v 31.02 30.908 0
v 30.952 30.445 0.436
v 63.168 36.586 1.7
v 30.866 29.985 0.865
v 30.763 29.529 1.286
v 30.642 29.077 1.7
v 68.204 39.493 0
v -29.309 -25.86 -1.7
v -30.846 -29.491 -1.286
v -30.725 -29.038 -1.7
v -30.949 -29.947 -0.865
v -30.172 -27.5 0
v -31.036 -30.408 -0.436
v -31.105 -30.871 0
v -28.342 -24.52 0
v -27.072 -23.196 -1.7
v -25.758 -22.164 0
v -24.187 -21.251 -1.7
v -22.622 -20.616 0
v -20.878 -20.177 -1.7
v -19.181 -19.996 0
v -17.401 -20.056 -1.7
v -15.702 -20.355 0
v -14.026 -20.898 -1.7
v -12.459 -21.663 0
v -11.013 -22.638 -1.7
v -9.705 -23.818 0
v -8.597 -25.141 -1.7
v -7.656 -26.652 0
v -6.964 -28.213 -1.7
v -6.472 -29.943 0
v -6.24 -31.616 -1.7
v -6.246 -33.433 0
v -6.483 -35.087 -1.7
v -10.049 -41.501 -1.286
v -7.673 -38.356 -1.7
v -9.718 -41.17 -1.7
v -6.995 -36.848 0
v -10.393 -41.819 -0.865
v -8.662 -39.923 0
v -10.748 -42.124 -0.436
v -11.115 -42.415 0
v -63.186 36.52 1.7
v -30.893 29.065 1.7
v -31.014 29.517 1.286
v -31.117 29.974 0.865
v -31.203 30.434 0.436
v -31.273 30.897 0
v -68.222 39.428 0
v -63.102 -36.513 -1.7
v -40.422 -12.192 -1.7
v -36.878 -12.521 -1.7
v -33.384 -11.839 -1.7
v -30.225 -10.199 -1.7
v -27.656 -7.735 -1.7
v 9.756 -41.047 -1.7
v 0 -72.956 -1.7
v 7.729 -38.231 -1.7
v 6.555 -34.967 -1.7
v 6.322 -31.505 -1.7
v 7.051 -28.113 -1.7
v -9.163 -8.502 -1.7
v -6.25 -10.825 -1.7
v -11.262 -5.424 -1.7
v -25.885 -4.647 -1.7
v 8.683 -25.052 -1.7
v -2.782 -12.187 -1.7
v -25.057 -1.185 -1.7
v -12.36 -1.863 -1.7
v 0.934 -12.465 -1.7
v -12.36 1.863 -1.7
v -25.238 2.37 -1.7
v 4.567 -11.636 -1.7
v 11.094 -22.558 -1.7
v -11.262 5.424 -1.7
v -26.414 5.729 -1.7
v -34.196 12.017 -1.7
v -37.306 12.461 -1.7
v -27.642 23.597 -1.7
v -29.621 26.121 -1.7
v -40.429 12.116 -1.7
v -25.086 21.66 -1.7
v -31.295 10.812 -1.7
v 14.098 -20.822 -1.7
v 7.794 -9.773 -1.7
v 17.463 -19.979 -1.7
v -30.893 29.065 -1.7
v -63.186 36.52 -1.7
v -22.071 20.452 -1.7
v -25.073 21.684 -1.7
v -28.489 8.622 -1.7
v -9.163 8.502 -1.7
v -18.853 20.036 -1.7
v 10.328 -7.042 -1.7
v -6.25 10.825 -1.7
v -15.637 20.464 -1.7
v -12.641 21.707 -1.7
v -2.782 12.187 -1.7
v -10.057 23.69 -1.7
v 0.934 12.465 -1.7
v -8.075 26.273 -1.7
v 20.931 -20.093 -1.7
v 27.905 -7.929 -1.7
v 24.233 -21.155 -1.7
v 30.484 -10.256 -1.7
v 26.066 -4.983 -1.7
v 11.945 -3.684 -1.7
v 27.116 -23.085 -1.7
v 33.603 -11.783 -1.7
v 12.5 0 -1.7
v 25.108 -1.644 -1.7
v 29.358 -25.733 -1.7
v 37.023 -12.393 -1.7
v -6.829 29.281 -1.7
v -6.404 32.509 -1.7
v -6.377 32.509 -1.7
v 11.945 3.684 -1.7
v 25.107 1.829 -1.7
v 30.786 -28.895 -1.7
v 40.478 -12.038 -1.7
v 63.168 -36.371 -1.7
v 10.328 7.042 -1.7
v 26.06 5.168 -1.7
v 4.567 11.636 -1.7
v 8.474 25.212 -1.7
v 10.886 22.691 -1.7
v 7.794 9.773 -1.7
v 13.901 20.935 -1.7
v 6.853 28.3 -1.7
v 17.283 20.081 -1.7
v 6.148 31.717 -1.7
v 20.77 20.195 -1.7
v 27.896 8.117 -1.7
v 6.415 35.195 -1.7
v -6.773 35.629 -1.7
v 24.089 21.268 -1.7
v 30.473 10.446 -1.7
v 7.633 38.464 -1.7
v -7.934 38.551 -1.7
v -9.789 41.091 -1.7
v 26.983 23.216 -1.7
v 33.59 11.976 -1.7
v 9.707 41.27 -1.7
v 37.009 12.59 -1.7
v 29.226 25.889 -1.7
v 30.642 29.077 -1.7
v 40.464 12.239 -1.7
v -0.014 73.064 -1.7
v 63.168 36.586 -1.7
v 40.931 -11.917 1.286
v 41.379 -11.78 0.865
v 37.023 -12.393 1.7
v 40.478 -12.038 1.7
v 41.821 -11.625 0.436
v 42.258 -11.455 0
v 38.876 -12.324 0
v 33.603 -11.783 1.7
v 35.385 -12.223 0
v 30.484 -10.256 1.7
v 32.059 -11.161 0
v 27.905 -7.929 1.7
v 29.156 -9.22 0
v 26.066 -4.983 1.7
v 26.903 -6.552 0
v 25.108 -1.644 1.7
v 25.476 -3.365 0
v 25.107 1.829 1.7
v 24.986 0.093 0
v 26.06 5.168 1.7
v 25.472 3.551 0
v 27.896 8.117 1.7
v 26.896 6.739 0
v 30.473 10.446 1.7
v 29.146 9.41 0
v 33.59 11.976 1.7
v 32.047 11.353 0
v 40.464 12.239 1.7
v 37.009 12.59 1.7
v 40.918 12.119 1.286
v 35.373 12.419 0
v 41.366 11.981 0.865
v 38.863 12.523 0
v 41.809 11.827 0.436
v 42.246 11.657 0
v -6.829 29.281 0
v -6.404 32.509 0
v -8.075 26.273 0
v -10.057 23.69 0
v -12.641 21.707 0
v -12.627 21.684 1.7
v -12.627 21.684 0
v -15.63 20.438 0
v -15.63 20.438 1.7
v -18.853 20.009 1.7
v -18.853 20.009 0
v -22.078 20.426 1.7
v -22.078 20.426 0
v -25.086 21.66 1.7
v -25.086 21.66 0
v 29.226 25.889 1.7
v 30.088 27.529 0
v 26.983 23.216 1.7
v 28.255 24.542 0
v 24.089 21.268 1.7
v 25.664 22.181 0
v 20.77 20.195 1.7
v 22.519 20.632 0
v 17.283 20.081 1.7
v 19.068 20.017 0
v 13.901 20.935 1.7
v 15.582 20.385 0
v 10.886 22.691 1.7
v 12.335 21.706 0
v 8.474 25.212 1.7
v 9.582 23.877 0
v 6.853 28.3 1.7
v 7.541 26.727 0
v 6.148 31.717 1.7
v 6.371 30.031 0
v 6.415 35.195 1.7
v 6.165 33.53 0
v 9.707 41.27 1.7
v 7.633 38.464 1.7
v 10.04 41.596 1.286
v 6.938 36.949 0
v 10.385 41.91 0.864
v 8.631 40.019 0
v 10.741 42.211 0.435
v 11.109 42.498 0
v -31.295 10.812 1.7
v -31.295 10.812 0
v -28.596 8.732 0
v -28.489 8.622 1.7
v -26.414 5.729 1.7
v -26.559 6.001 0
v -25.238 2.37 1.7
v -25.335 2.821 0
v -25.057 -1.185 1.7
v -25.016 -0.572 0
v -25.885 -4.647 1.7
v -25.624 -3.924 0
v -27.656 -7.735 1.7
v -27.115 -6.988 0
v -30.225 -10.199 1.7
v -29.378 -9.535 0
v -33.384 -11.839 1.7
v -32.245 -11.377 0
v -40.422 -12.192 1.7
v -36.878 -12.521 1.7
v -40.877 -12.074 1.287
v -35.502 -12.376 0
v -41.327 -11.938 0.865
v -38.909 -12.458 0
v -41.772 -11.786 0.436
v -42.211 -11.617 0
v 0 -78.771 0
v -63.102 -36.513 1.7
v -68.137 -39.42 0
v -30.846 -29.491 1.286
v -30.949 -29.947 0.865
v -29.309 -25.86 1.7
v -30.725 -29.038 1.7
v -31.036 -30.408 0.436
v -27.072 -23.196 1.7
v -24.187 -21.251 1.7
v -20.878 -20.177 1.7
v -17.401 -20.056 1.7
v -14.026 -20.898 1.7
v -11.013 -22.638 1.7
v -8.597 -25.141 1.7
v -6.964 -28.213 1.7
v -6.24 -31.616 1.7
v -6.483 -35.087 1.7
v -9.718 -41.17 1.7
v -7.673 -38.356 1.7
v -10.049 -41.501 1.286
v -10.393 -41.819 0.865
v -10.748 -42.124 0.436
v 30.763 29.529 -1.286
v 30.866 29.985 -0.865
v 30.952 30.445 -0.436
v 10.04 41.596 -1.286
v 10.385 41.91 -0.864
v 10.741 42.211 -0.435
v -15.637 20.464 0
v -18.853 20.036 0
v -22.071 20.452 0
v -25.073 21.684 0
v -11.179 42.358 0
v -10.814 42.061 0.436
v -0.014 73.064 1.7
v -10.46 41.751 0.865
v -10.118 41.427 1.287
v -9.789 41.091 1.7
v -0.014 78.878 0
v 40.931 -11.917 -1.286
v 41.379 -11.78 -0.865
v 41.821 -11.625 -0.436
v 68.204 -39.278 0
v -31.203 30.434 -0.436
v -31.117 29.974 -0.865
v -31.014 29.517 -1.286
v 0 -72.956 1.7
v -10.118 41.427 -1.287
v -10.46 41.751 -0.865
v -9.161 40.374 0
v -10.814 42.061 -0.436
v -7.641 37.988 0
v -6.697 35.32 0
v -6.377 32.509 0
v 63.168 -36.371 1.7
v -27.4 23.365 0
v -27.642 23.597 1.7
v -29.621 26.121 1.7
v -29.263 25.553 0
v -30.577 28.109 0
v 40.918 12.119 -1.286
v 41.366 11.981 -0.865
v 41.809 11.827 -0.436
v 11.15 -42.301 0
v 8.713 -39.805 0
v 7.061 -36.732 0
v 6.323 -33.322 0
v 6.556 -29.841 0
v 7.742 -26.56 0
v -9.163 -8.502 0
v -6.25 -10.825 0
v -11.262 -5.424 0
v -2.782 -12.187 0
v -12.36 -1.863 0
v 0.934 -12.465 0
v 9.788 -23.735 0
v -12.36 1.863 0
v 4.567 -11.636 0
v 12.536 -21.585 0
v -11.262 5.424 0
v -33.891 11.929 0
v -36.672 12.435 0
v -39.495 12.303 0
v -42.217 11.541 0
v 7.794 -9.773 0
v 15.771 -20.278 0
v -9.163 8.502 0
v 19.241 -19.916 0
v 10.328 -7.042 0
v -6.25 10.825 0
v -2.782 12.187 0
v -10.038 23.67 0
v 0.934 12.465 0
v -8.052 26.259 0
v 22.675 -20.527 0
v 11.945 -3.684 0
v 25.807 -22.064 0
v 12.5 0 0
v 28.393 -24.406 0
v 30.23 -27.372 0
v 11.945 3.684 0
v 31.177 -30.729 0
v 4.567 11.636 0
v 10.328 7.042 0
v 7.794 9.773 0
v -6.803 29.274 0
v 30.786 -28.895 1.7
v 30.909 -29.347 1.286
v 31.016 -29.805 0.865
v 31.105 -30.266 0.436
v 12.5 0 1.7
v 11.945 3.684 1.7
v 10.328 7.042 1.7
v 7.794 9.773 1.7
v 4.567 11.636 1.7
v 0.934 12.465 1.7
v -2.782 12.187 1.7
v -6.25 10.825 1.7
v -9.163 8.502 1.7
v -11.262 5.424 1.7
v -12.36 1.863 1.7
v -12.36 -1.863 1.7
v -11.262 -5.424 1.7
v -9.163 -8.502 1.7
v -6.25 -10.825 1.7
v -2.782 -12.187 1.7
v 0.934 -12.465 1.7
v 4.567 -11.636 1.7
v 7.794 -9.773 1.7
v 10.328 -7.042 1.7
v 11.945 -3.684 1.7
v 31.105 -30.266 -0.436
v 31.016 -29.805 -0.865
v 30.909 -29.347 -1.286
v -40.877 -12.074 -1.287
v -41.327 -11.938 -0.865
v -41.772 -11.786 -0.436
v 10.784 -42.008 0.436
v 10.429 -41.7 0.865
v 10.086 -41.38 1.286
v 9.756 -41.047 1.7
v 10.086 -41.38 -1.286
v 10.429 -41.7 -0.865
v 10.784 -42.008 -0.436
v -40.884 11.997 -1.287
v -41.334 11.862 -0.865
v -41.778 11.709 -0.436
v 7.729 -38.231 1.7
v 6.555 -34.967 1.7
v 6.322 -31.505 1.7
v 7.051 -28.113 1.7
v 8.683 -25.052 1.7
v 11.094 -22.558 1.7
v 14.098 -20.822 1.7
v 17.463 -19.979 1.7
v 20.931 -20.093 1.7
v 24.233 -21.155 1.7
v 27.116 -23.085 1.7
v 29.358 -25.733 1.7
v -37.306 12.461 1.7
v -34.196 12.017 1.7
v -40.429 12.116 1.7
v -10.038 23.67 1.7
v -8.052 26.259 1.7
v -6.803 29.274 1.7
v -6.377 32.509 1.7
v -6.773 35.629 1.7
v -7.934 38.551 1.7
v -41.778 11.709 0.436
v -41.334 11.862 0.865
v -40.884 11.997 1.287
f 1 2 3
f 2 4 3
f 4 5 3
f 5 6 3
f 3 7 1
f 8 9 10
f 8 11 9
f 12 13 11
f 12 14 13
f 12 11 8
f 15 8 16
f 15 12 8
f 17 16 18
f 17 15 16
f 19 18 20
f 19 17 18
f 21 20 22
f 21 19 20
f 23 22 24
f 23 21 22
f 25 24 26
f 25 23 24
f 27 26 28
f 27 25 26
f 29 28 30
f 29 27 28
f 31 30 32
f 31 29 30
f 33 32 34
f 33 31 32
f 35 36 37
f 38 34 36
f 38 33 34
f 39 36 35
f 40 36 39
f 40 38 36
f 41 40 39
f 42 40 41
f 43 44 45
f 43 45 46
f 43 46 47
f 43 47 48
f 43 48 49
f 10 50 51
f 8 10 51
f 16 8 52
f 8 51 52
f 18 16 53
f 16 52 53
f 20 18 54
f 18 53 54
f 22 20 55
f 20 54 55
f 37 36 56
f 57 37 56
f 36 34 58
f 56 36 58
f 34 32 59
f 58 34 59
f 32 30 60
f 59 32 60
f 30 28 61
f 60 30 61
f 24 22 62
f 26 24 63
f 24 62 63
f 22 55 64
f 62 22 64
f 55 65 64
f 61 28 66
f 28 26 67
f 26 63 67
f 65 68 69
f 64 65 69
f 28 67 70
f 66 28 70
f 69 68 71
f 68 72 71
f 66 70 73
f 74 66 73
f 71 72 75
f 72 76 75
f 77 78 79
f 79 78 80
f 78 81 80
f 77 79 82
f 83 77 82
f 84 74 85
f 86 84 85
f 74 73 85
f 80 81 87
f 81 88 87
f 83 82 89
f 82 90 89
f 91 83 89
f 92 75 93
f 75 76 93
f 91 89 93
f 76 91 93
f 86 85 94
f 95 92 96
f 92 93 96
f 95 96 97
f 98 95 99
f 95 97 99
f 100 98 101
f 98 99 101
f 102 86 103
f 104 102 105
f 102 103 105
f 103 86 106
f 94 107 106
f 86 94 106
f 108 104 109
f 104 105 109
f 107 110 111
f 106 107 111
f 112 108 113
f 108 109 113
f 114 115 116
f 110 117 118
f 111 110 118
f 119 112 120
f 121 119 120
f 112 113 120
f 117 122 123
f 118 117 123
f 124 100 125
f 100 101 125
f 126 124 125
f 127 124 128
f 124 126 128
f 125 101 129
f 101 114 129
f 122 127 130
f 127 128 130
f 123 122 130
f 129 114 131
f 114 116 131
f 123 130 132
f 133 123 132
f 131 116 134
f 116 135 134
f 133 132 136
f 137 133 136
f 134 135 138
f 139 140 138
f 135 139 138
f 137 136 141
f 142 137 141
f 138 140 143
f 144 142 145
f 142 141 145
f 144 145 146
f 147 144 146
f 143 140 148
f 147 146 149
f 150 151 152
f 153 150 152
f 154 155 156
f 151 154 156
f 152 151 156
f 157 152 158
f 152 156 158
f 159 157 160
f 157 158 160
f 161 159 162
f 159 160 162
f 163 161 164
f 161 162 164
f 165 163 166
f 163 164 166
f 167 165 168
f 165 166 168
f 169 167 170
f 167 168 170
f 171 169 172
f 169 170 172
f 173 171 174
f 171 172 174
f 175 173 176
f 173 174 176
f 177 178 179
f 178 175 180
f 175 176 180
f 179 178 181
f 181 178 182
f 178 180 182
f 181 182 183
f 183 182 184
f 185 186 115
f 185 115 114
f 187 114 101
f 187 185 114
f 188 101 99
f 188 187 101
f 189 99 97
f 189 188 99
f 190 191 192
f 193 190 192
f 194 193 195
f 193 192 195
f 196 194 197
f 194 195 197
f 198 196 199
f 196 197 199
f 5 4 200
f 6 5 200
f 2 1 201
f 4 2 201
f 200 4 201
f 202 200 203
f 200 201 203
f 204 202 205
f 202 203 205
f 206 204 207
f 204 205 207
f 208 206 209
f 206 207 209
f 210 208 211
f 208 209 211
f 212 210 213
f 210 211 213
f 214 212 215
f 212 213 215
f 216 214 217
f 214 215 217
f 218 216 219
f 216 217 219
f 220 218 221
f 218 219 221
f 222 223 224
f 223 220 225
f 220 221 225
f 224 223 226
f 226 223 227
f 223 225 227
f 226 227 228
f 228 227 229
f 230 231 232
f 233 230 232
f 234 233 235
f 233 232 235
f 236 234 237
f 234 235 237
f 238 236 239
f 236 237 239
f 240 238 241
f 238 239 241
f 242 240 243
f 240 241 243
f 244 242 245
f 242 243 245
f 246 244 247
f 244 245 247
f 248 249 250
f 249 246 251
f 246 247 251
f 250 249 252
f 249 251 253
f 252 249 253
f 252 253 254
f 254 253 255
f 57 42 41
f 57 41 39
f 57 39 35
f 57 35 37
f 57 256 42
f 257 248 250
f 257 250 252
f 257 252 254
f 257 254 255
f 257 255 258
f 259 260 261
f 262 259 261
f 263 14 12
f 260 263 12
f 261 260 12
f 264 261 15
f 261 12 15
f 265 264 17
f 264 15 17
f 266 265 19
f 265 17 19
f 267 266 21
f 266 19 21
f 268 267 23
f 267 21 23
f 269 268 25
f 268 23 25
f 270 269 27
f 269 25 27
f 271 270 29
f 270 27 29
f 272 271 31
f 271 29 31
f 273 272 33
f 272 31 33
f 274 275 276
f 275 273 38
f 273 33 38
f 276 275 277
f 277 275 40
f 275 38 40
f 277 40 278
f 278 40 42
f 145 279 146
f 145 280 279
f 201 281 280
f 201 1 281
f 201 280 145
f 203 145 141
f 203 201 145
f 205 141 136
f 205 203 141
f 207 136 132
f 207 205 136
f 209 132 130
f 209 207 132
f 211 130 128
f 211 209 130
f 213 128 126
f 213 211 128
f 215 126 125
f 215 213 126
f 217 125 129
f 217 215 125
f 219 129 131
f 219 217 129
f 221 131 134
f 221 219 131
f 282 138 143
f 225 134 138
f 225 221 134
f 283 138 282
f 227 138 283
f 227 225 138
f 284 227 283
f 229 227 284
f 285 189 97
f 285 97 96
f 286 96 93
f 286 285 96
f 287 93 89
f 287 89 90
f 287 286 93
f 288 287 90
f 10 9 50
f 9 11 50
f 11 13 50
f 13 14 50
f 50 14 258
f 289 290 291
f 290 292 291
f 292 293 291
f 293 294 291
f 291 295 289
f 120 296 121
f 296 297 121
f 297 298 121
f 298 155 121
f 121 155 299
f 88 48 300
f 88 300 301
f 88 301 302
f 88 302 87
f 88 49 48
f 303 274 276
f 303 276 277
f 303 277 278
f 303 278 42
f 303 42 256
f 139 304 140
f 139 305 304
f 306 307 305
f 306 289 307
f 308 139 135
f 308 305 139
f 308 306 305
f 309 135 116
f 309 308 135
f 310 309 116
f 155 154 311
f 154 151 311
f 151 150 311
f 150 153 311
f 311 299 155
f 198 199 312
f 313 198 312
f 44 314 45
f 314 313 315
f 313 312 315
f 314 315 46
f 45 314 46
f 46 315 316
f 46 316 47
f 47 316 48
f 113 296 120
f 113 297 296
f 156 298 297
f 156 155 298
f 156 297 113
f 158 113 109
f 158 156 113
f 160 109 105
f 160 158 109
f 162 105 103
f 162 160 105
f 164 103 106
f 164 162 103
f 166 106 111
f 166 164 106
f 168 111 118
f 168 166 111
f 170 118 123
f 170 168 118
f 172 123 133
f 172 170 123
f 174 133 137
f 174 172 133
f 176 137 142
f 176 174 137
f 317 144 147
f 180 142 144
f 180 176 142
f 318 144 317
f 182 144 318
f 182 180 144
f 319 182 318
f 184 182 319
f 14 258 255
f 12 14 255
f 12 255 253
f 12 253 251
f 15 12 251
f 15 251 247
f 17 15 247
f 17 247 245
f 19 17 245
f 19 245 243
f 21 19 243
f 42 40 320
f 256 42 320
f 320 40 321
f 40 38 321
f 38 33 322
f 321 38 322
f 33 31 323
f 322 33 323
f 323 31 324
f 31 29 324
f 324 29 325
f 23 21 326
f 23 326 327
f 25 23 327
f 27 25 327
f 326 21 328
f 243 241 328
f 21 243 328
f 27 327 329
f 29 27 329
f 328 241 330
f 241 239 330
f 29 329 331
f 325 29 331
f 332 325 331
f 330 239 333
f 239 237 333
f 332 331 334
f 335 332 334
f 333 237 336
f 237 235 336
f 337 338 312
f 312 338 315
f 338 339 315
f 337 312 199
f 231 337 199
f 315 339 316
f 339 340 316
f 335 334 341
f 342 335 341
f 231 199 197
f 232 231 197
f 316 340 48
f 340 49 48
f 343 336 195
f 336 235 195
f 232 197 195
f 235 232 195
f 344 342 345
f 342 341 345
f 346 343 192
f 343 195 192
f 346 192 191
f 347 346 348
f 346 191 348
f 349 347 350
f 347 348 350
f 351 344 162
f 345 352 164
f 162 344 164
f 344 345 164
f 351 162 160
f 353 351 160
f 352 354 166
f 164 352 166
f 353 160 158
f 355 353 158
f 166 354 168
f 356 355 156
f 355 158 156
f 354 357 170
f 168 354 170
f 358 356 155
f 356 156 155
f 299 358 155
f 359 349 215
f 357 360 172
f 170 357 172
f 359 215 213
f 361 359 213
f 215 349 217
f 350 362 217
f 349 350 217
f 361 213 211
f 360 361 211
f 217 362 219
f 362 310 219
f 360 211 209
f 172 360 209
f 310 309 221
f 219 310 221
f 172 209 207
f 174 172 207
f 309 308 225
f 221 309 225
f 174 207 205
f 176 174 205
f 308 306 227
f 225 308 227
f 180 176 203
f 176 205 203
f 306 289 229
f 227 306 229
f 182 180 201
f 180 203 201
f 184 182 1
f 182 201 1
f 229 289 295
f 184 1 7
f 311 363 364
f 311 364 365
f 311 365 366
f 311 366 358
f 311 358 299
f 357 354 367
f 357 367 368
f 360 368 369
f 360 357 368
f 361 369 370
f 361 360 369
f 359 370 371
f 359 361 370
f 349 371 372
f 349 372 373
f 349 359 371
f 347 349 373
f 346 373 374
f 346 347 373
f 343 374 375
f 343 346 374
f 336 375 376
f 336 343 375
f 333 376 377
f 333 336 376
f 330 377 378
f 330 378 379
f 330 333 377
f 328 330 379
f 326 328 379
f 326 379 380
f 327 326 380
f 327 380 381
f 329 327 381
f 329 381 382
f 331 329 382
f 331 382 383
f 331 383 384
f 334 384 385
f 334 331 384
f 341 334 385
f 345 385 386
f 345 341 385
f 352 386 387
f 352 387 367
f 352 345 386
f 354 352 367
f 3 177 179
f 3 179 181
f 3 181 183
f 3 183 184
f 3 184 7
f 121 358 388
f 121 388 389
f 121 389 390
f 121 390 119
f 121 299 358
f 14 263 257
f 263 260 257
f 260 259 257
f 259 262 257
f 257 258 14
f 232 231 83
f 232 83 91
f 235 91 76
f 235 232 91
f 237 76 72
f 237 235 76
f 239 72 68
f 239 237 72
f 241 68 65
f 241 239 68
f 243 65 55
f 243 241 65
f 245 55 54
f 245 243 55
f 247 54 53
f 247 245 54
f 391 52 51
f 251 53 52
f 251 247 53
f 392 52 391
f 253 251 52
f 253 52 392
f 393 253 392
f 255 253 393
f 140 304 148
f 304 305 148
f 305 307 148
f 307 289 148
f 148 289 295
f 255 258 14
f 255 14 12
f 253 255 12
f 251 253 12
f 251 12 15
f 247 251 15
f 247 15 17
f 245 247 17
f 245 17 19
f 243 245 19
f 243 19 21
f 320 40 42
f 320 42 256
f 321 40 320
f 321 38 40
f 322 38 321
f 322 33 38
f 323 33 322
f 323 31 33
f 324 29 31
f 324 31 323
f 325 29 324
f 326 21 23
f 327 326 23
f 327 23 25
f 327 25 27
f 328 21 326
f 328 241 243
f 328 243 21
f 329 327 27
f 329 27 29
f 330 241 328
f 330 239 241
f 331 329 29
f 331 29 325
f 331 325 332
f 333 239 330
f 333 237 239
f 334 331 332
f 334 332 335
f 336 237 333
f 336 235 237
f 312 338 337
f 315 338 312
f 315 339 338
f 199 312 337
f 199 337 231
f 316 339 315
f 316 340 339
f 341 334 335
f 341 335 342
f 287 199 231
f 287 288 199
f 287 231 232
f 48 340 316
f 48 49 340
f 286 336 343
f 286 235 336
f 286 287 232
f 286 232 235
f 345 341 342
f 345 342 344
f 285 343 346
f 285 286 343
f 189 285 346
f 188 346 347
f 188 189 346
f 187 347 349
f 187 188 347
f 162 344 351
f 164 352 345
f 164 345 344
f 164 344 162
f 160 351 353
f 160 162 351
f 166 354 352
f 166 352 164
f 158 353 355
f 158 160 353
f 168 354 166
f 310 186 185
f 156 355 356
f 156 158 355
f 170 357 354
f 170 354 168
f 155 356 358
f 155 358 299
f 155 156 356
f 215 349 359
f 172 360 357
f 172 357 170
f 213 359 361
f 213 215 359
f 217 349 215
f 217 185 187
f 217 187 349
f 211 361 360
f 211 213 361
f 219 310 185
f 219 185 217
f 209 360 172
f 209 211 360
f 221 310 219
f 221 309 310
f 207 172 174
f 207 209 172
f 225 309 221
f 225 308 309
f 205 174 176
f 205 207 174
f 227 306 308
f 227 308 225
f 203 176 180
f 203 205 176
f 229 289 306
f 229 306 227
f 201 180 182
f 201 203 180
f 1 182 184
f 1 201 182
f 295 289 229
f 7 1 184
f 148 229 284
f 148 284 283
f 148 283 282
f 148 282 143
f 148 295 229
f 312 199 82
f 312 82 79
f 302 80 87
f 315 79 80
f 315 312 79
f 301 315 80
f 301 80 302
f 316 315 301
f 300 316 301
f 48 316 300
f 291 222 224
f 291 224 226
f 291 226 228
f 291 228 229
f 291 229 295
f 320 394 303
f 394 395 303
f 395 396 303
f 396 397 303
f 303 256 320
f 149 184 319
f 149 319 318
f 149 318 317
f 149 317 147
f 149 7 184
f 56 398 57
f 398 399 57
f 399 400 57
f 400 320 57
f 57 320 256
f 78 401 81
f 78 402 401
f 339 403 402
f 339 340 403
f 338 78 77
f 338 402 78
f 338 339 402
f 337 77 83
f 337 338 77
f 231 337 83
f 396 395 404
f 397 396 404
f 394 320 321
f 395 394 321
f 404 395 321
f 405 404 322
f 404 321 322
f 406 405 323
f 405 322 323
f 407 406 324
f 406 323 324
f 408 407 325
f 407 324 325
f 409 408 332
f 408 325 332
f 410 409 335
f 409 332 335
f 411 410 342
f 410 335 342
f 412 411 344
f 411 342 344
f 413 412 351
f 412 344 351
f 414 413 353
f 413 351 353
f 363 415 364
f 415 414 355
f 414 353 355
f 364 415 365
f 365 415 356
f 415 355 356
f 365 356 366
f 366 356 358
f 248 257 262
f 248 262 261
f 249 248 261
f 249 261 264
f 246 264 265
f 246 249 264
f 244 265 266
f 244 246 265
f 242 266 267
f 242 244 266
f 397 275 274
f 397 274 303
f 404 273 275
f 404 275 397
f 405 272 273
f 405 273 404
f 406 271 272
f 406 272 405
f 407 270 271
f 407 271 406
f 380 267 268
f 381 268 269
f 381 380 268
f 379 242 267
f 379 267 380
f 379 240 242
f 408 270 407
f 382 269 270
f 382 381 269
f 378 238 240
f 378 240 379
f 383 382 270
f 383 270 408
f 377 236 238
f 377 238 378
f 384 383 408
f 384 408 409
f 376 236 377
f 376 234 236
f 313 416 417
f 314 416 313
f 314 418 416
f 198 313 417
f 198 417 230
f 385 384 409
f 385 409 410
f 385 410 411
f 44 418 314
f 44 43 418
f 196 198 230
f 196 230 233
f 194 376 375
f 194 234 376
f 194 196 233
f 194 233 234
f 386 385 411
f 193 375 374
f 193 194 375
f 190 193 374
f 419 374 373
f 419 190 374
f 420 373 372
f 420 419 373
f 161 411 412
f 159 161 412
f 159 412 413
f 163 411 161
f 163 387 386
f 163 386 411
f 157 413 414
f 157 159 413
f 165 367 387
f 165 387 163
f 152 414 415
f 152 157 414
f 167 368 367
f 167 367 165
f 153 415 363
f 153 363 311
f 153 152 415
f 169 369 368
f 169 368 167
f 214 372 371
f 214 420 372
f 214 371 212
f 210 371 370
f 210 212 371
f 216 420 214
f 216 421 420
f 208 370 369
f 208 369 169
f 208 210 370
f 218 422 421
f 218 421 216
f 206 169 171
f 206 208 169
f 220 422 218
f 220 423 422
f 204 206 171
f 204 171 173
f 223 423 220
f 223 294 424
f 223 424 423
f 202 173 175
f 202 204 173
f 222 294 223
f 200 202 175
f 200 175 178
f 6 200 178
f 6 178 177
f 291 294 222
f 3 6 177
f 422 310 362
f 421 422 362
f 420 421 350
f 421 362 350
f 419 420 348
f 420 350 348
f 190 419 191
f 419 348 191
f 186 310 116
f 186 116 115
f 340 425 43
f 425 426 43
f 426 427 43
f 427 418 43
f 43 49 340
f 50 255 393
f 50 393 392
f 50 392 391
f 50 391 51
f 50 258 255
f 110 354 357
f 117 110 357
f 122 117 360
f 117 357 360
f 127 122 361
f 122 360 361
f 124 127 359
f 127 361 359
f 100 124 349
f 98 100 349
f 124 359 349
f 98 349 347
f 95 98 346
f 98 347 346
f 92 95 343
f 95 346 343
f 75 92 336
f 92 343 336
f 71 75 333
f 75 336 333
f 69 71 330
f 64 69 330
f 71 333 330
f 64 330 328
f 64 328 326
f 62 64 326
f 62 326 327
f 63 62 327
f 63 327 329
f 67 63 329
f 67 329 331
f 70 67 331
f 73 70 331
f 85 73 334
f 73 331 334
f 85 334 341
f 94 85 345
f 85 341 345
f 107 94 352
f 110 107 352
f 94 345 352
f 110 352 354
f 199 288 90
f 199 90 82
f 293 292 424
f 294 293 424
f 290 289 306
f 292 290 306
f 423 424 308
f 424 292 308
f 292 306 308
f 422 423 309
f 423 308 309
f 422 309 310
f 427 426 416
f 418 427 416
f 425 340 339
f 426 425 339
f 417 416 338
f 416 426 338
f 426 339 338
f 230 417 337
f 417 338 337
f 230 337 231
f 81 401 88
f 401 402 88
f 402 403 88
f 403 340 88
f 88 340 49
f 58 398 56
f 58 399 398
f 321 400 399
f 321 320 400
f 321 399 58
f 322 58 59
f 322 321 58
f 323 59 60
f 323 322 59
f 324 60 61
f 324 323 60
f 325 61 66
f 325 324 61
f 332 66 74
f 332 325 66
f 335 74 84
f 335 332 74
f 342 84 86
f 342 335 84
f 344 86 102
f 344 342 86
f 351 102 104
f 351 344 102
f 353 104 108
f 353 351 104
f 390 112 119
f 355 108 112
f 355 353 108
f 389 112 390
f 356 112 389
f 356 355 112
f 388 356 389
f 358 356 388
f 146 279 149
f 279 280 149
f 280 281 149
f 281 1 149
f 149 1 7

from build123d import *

# Parameters (mm, degrees)
F0_R         = 12.5
F1_DEPTH     = 1.7
F2_T1_DEPTH  = 57.3976375262
F2_T3_DEPTH  = 57.1989693925
F2_T5_DEPTH  = 57.4520267978
F2_T7_DEPTH  = 57.3309437412
F2_T9_DEPTH  = 57.4405501522
F2_T11_DEPTH = 57.3333306688
F2_T13_DEPTH = 57.3176158442
F2_T15_DEPTH = 57.2711320889
F2_T17_DEPTH = 57.4067836399
F2_T19_DEPTH = 57.2939176083
F2_T21_DEPTH = 57.2816108198
F2_T23_DEPTH = 57.2833301593
F3_DEPTH     = 1.7
F4_T1_DEPTH  = 57.4067836399
F4_T3_DEPTH  = 57.2939176083
F4_T5_DEPTH  = 57.2711320889
F4_T7_DEPTH  = 57.3176158442
F4_T9_DEPTH  = 57.3333306688
F4_T11_DEPTH = 57.4405501522
F4_T13_DEPTH = 57.3309437412
F4_T15_DEPTH = 57.4520267978
F4_T17_DEPTH = 57.1989693925
F4_T19_DEPTH = 57.3976375262
F4_T21_DEPTH = 57.2816108198
F4_T23_DEPTH = 57.2833301593


# Not quite as in the source:
# - a fillet or chamfer that OpenCascade refuses, or shapes differently, is made with other operations: its cross-section is extruded or revolved along the edge and cut away or added


with BuildPart() as f1:
    # F0 (on Top) → F1 (new body)
    with BuildSketch(Plane.XY):
        with BuildLine():
            ThreePointArc((-12.6269337533, 21.6838866314), (-18.8533795427, 20.0092263707), (-25.0860923523, 21.6604093381))
            ThreePointArc((-25.0860923523, 21.6604093381), (-29.6261220625, 26.129161021), (-31.3743477244, 32.2549522685))
            Line((-31.3743477244, 32.2549522685), (-72.0726857195, 41.6509039433))
            Line((-72.0726857195, 41.6509039433), (-43.4508925376, 10.9577885101))
            ThreePointArc((-43.4508925376, 10.9577885101), (-37.3541054261, 12.4619159711), (-31.2952509513, 10.8116144975))
            ThreePointArc((-31.2952509513, 10.8116144975), (-26.5801816353, -6.1126428325), (-43.4452596611, -11.0351937982))
            Line((-43.4452596611, -11.0351937982), (-71.9879228197, -41.6434526702))
            Line((-71.9879228197, -41.6434526702), (-31.2073862187, -32.228523952))
            ThreePointArc((-31.2073862187, -32.228523952), (-12.4587232405, -21.6629522163), (-12.2397963262, -43.1826116137))
            Line((-12.2397963262, -43.1826116137), (0, -83.217181477))
            Line((0, -83.217181477), (12.2727951603, -43.0746772909))
            ThreePointArc((12.2727951603, -43.0746772909), (12.5361536488, -21.5848137797), (31.2857724927, -32.0888789276))
            Line((31.2857724927, -32.0888789276), (72.0544236589, -41.501063677))
            Line((72.0544236589, -41.501063677), (43.4872051328, -10.8664723972))
            ThreePointArc((43.4872051328, -10.8664723972), (24.9862322359, 0.0927434014), (43.4764876483, 11.0700319481))
            Line((43.4764876483, 11.0700319481), (72.0544236589, 41.716116323))
            Line((72.0544236589, 41.716116323), (31.1206966034, 32.2658208016))
            ThreePointArc((31.1206966034, 32.2658208016), (12.3360655616, 21.7053334655), (12.2368534674, 43.2547281928))
            Line((12.2368534674, 43.2547281928), (-0.0137682524, 83.324706323))
            Line((-0.0137682524, 83.324706323), (-12.2997912318, 43.1389358899))
            ThreePointArc((-12.2997912318, 43.1389358899), (-7.9575866684, 38.5934345524), (-6.3769337533, 32.5092041787))
            ThreePointArc((-6.3769337533, 32.5092041787), (-8.051616206, 26.2592041787), (-12.6269337533, 21.6838866314))
        make_face()
        Circle(F0_R, mode=Mode.SUBTRACT)
    extrude(amount=F1_DEPTH)

    # F2: chamfer of 3 on 12 edges, made by hand

    # F2_s2 → F2_t1 (cut)
    with BuildSketch(Plane(origin=(-59.5589476137, 63.869151823, 0), x_dir=(0, 0, 1), z_dir=(0.6819983601, -0.7313537016, 0))):
        Polygon((1.7, 21.3047773022), (-1.3, 24.3047773022), (1.7, 24.3047773022), align=None)
    extrude(amount=F2_T1_DEPTH, mode=Mode.SUBTRACT)

    # F2_s4 → F2_t3 (cut)
    with BuildSketch(Plane(origin=(-29.3392197818, 6.7734926001, 0), x_dir=(0, 0, 1), z_dir=(-0.9743700648, 0.2249510543, 0))):
        Polygon((1.7, 21.3705673316), (-1.3, 24.3705673316), (1.7, 24.3705673316), align=None)
    extrude(amount=F2_T3_DEPTH, mode=Mode.SUBTRACT)

    # F2_s6 → F2_t5 (cut)
    with BuildSketch(Plane(origin=(25.5517773205, 83.5760977556, 0), x_dir=(0, 0, 1), z_dir=(-0.2923717047, -0.956304756, 0))):
        Polygon((1.7, 21.3749530784), (-1.3, 24.3749530784), (1.7, 24.3749530784), align=None)
    extrude(amount=F2_T5_DEPTH, mode=Mode.SUBTRACT)

    # F2_s8 → F2_t7 (cut)
    with BuildSketch(Plane(origin=(-8.7921854193, 28.757942701, 0), x_dir=(0, 0, 1), z_dir=(-0.2923717047, 0.956304756, 0))):
        Polygon((1.7, 21.348619788), (-1.3, 24.348619788), (1.7, 24.348619788), align=None)
    extrude(amount=F2_T7_DEPTH, mode=Mode.SUBTRACT)

    # F2_s10 → F2_t9 (cut)
    with BuildSketch(Plane(origin=(85.0691389614, 19.6397582326, 0), x_dir=(0, 0, 1), z_dir=(-0.9743700648, -0.2249510543, 0))):
        Polygon((1.7, 21.438216392), (-1.3, 24.438216392), (1.7, 24.438216392), align=None)
    extrude(amount=F2_T9_DEPTH, mode=Mode.SUBTRACT)

    # F2_s12 → F2_t11 (cut)
    with BuildSketch(Plane(origin=(20.4817428017, 21.9639801073, 0), x_dir=(0, 0, 1), z_dir=(0.6819983601, 0.7313537016, 0))):
        Polygon((1.7, 21.2469465406), (-1.3, 24.2469465406), (1.7, 24.2469465406), align=None)
    extrude(amount=F2_T11_DEPTH, mode=Mode.SUBTRACT)

    # F2_s14 → F2_t13 (cut)
    with BuildSketch(Plane(origin=(59.4757159005, -63.779896738, 0), x_dir=(0, 0, 1), z_dir=(-0.6819983601, 0.7313537016, 0))):
        Polygon((1.7, 21.3936120924), (-1.3, 24.3936120924), (1.7, 24.3936120924), align=None)
    extrude(amount=F2_T13_DEPTH, mode=Mode.SUBTRACT)

    # F2_s16 → F2_t15 (cut)
    with BuildSketch(Plane(origin=(29.2187258401, -6.7456743817, 0), x_dir=(0, 0, 1), z_dir=(0.9743700648, -0.2249510543, 0))):
        Polygon((1.7, 21.2286755314), (-1.3, 24.2286755314), (1.7, 24.2286755314), align=None)
    extrude(amount=F2_T15_DEPTH, mode=Mode.SUBTRACT)

    # F2_s18 → F2_t17 (cut)
    with BuildSketch(Plane(origin=(-25.522890682, -83.4816138184, 0), x_dir=(0, 0, 1), z_dir=(0.2923717047, 0.956304756, 0))):
        Polygon((1.7, 21.3303492106), (-1.3, 24.3303492106), (1.7, 24.3303492106), align=None)
    extrude(amount=F2_T17_DEPTH, mode=Mode.SUBTRACT)

    # F2_s20 → F2_t19 (cut)
    with BuildSketch(Plane(origin=(8.7717703206, -28.6911679218, 0), x_dir=(0, 0, 1), z_dir=(0.2923717047, -0.956304756, 0))):
        Polygon((1.7, 21.3303492106), (-1.3, 24.3303492106), (1.7, 24.3303492106), align=None)
    extrude(amount=F2_T19_DEPTH, mode=Mode.SUBTRACT)

    # F2_s22 → F2_t21 (cut)
    with BuildSketch(Plane(origin=(-20.4498413423, -21.9297699805, 0), x_dir=(0, 0, 1), z_dir=(-0.6819983601, -0.7313537016, 0))):
        Polygon((1.7, 21.2478673976), (-1.3, 24.2478673976), (1.7, 24.2478673976), align=None)
    extrude(amount=F2_T21_DEPTH, mode=Mode.SUBTRACT)

    # F2_s24 → F2_t23 (cut)
    with BuildSketch(Plane(origin=(-84.9900764381, -19.6215052109, 0), x_dir=(0, 0, 1), z_dir=(0.9743700648, 0.2249510543, 0))):
        Polygon((1.7, 21.3823745378), (-1.3, 24.3823745378), (1.7, 24.3823745378), align=None)
    extrude(amount=F2_T23_DEPTH, mode=Mode.SUBTRACT)


with BuildPart() as f3:
    # F0 (on Top) → F3 (new body)
    with BuildSketch(Plane.XY):
        with BuildLine():
            ThreePointArc((-12.640536442, 21.7074471794), (-18.8534308068, 20.0364316999), (-25.072578552, 21.6840209828))
            Line((-25.072578552, 21.6840209828), (-25.0860923523, 21.6604093381))
            ThreePointArc((-25.0860923523, 21.6604093381), (-18.8533795427, 20.0092263707), (-12.6269337533, 21.6838866314))
            Line((-12.6269337533, 21.6838866314), (-12.640536442, 21.7074471794))
        make_face()
        with BuildLine():
            ThreePointArc((-6.4041391307, 32.5092041787), (-8.075176754, 26.2728068674), (-12.640536442, 21.7074471794))
            Line((-12.640536442, 21.7074471794), (-12.6269337533, 21.6838866314))
            ThreePointArc((-12.6269337533, 21.6838866314), (-8.051616206, 26.2592041787), (-6.3769337533, 32.5092041787))
            Line((-6.3769337533, 32.5092041787), (-6.4041391307, 32.5092041787))
        make_face()
        with BuildLine():
            ThreePointArc((-12.6269337533, 21.6838866314), (-18.8533795427, 20.0092263707), (-25.0860923523, 21.6604093381))
            ThreePointArc((-25.0860923523, 21.6604093381), (-29.6261220625, 26.129161021), (-31.3743477244, 32.2549522685))
            Line((-31.3743477244, 32.2549522685), (-72.0726857195, 41.6509039433))
            Line((-72.0726857195, 41.6509039433), (-43.4508925376, 10.9577885101))
            ThreePointArc((-43.4508925376, 10.9577885101), (-37.3541054261, 12.4619159711), (-31.2952509513, 10.8116144975))
            ThreePointArc((-31.2952509513, 10.8116144975), (-26.5801816353, -6.1126428325), (-43.4452596611, -11.0351937982))
            Line((-43.4452596611, -11.0351937982), (-71.9879228197, -41.6434526702))
            Line((-71.9879228197, -41.6434526702), (-31.2073862187, -32.228523952))
            ThreePointArc((-31.2073862187, -32.228523952), (-12.4587232405, -21.6629522163), (-12.2397963262, -43.1826116137))
            Line((-12.2397963262, -43.1826116137), (0, -83.217181477))
            Line((0, -83.217181477), (12.2727951603, -43.0746772909))
            ThreePointArc((12.2727951603, -43.0746772909), (12.5361536488, -21.5848137797), (31.2857724927, -32.0888789276))
            Line((31.2857724927, -32.0888789276), (72.0544236589, -41.501063677))
            Line((72.0544236589, -41.501063677), (43.4872051328, -10.8664723972))
            ThreePointArc((43.4872051328, -10.8664723972), (24.9862322359, 0.0927434014), (43.4764876483, 11.0700319481))
            Line((43.4764876483, 11.0700319481), (72.0544236589, 41.716116323))
            Line((72.0544236589, 41.716116323), (31.1206966034, 32.2658208016))
            ThreePointArc((31.1206966034, 32.2658208016), (12.3360655616, 21.7053334655), (12.2368534674, 43.2547281928))
            Line((12.2368534674, 43.2547281928), (-0.0137682524, 83.324706323))
            Line((-0.0137682524, 83.324706323), (-12.2997912318, 43.1389358899))
            ThreePointArc((-12.2997912318, 43.1389358899), (-7.9575866684, 38.5934345524), (-6.3769337533, 32.5092041787))
            ThreePointArc((-6.3769337533, 32.5092041787), (-8.051616206, 26.2592041787), (-12.6269337533, 21.6838866314))
        make_face()
        Circle(F0_R, mode=Mode.SUBTRACT)
    extrude(amount=-F3_DEPTH)

    # F4: chamfer of 3 on 12 edges, made by hand

    # F4_s2 → F4_t1 (cut)
    with BuildSketch(Plane(origin=(-25.522890682, -83.4816138184, 0), x_dir=(0, 0, 1), z_dir=(0.2923717047, 0.956304756, 0))):
        Polygon((1.3, 24.3303492106), (-1.7, 21.3303492106), (-1.7, 24.3303492106), align=None)
    extrude(amount=F4_T1_DEPTH, mode=Mode.SUBTRACT)

    # F4_s4 → F4_t3 (cut)
    with BuildSketch(Plane(origin=(8.7717703206, -28.6911679218, 0), x_dir=(0, 0, 1), z_dir=(0.2923717047, -0.956304756, 0))):
        Polygon((1.3, 24.3303492106), (-1.7, 21.3303492106), (-1.7, 24.3303492106), align=None)
    extrude(amount=F4_T3_DEPTH, mode=Mode.SUBTRACT)

    # F4_s6 → F4_t5 (cut)
    with BuildSketch(Plane(origin=(29.2187258401, -6.7456743817, 0), x_dir=(0, 0, 1), z_dir=(0.9743700648, -0.2249510543, 0))):
        Polygon((1.3, 24.2286755314), (-1.7, 21.2286755314), (-1.7, 24.2286755314), align=None)
    extrude(amount=F4_T5_DEPTH, mode=Mode.SUBTRACT)

    # F4_s8 → F4_t7 (cut)
    with BuildSketch(Plane(origin=(59.4757159005, -63.779896738, 0), x_dir=(0, 0, 1), z_dir=(-0.6819983601, 0.7313537016, 0))):
        Polygon((1.3, 24.3936120924), (-1.7, 21.3936120924), (-1.7, 24.3936120924), align=None)
    extrude(amount=F4_T7_DEPTH, mode=Mode.SUBTRACT)

    # F4_s10 → F4_t9 (cut)
    with BuildSketch(Plane(origin=(20.4817428017, 21.9639801073, 0), x_dir=(0, 0, 1), z_dir=(0.6819983601, 0.7313537016, 0))):
        Polygon((1.3, 24.2469465406), (-1.7, 21.2469465406), (-1.7, 24.2469465406), align=None)
    extrude(amount=F4_T9_DEPTH, mode=Mode.SUBTRACT)

    # F4_s12 → F4_t11 (cut)
    with BuildSketch(Plane(origin=(85.0691389614, 19.6397582326, 0), x_dir=(0, 0, 1), z_dir=(-0.9743700648, -0.2249510543, 0))):
        Polygon((1.3, 24.438216392), (-1.7, 21.438216392), (-1.7, 24.438216392), align=None)
    extrude(amount=F4_T11_DEPTH, mode=Mode.SUBTRACT)

    # F4_s14 → F4_t13 (cut)
    with BuildSketch(Plane(origin=(-8.7921854193, 28.757942701, 0), x_dir=(0, 0, 1), z_dir=(-0.2923717047, 0.956304756, 0))):
        Polygon((1.3, 24.348619788), (-1.7, 21.348619788), (-1.7, 24.348619788), align=None)
    extrude(amount=F4_T13_DEPTH, mode=Mode.SUBTRACT)

    # F4_s16 → F4_t15 (cut)
    with BuildSketch(Plane(origin=(25.5517773205, 83.5760977556, 0), x_dir=(0, 0, 1), z_dir=(-0.2923717047, -0.956304756, 0))):
        Polygon((1.3, 24.3749530784), (-1.7, 21.3749530784), (-1.7, 24.3749530784), align=None)
    extrude(amount=F4_T15_DEPTH, mode=Mode.SUBTRACT)

    # F4_s18 → F4_t17 (cut)
    with BuildSketch(Plane(origin=(-29.3392197818, 6.7734926001, 0), x_dir=(0, 0, 1), z_dir=(-0.9743700648, 0.2249510543, 0))):
        Polygon((1.3, 24.3705673316), (-1.7, 21.3705673316), (-1.7, 24.3705673316), align=None)
    extrude(amount=F4_T17_DEPTH, mode=Mode.SUBTRACT)

    # F4_s20 → F4_t19 (cut)
    with BuildSketch(Plane(origin=(-59.5589476137, 63.869151823, 0), x_dir=(0, 0, 1), z_dir=(0.6819983601, -0.7313537016, 0))):
        Polygon((1.3, 24.3047773022), (-1.7, 21.3047773022), (-1.7, 24.3047773022), align=None)
    extrude(amount=F4_T19_DEPTH, mode=Mode.SUBTRACT)

    # F4_s22 → F4_t21 (cut)
    with BuildSketch(Plane(origin=(-20.4498413423, -21.9297699805, 0), x_dir=(0, 0, 1), z_dir=(-0.6819983601, -0.7313537016, 0))):
        Polygon((1.3, 24.2478673976), (-1.7, 21.2478673976), (-1.7, 24.2478673976), align=None)
    extrude(amount=F4_T21_DEPTH, mode=Mode.SUBTRACT)

    # F4_s24 → F4_t23 (cut)
    with BuildSketch(Plane(origin=(-84.9900764381, -19.6215052109, 0), x_dir=(0, 0, 1), z_dir=(0.9743700648, 0.2249510543, 0))):
        Polygon((1.3, 24.3823745378), (-1.7, 21.3823745378), (-1.7, 24.3823745378), align=None)
    extrude(amount=F4_T23_DEPTH, mode=Mode.SUBTRACT)


solid = Compound([f1.part, f3.part])
